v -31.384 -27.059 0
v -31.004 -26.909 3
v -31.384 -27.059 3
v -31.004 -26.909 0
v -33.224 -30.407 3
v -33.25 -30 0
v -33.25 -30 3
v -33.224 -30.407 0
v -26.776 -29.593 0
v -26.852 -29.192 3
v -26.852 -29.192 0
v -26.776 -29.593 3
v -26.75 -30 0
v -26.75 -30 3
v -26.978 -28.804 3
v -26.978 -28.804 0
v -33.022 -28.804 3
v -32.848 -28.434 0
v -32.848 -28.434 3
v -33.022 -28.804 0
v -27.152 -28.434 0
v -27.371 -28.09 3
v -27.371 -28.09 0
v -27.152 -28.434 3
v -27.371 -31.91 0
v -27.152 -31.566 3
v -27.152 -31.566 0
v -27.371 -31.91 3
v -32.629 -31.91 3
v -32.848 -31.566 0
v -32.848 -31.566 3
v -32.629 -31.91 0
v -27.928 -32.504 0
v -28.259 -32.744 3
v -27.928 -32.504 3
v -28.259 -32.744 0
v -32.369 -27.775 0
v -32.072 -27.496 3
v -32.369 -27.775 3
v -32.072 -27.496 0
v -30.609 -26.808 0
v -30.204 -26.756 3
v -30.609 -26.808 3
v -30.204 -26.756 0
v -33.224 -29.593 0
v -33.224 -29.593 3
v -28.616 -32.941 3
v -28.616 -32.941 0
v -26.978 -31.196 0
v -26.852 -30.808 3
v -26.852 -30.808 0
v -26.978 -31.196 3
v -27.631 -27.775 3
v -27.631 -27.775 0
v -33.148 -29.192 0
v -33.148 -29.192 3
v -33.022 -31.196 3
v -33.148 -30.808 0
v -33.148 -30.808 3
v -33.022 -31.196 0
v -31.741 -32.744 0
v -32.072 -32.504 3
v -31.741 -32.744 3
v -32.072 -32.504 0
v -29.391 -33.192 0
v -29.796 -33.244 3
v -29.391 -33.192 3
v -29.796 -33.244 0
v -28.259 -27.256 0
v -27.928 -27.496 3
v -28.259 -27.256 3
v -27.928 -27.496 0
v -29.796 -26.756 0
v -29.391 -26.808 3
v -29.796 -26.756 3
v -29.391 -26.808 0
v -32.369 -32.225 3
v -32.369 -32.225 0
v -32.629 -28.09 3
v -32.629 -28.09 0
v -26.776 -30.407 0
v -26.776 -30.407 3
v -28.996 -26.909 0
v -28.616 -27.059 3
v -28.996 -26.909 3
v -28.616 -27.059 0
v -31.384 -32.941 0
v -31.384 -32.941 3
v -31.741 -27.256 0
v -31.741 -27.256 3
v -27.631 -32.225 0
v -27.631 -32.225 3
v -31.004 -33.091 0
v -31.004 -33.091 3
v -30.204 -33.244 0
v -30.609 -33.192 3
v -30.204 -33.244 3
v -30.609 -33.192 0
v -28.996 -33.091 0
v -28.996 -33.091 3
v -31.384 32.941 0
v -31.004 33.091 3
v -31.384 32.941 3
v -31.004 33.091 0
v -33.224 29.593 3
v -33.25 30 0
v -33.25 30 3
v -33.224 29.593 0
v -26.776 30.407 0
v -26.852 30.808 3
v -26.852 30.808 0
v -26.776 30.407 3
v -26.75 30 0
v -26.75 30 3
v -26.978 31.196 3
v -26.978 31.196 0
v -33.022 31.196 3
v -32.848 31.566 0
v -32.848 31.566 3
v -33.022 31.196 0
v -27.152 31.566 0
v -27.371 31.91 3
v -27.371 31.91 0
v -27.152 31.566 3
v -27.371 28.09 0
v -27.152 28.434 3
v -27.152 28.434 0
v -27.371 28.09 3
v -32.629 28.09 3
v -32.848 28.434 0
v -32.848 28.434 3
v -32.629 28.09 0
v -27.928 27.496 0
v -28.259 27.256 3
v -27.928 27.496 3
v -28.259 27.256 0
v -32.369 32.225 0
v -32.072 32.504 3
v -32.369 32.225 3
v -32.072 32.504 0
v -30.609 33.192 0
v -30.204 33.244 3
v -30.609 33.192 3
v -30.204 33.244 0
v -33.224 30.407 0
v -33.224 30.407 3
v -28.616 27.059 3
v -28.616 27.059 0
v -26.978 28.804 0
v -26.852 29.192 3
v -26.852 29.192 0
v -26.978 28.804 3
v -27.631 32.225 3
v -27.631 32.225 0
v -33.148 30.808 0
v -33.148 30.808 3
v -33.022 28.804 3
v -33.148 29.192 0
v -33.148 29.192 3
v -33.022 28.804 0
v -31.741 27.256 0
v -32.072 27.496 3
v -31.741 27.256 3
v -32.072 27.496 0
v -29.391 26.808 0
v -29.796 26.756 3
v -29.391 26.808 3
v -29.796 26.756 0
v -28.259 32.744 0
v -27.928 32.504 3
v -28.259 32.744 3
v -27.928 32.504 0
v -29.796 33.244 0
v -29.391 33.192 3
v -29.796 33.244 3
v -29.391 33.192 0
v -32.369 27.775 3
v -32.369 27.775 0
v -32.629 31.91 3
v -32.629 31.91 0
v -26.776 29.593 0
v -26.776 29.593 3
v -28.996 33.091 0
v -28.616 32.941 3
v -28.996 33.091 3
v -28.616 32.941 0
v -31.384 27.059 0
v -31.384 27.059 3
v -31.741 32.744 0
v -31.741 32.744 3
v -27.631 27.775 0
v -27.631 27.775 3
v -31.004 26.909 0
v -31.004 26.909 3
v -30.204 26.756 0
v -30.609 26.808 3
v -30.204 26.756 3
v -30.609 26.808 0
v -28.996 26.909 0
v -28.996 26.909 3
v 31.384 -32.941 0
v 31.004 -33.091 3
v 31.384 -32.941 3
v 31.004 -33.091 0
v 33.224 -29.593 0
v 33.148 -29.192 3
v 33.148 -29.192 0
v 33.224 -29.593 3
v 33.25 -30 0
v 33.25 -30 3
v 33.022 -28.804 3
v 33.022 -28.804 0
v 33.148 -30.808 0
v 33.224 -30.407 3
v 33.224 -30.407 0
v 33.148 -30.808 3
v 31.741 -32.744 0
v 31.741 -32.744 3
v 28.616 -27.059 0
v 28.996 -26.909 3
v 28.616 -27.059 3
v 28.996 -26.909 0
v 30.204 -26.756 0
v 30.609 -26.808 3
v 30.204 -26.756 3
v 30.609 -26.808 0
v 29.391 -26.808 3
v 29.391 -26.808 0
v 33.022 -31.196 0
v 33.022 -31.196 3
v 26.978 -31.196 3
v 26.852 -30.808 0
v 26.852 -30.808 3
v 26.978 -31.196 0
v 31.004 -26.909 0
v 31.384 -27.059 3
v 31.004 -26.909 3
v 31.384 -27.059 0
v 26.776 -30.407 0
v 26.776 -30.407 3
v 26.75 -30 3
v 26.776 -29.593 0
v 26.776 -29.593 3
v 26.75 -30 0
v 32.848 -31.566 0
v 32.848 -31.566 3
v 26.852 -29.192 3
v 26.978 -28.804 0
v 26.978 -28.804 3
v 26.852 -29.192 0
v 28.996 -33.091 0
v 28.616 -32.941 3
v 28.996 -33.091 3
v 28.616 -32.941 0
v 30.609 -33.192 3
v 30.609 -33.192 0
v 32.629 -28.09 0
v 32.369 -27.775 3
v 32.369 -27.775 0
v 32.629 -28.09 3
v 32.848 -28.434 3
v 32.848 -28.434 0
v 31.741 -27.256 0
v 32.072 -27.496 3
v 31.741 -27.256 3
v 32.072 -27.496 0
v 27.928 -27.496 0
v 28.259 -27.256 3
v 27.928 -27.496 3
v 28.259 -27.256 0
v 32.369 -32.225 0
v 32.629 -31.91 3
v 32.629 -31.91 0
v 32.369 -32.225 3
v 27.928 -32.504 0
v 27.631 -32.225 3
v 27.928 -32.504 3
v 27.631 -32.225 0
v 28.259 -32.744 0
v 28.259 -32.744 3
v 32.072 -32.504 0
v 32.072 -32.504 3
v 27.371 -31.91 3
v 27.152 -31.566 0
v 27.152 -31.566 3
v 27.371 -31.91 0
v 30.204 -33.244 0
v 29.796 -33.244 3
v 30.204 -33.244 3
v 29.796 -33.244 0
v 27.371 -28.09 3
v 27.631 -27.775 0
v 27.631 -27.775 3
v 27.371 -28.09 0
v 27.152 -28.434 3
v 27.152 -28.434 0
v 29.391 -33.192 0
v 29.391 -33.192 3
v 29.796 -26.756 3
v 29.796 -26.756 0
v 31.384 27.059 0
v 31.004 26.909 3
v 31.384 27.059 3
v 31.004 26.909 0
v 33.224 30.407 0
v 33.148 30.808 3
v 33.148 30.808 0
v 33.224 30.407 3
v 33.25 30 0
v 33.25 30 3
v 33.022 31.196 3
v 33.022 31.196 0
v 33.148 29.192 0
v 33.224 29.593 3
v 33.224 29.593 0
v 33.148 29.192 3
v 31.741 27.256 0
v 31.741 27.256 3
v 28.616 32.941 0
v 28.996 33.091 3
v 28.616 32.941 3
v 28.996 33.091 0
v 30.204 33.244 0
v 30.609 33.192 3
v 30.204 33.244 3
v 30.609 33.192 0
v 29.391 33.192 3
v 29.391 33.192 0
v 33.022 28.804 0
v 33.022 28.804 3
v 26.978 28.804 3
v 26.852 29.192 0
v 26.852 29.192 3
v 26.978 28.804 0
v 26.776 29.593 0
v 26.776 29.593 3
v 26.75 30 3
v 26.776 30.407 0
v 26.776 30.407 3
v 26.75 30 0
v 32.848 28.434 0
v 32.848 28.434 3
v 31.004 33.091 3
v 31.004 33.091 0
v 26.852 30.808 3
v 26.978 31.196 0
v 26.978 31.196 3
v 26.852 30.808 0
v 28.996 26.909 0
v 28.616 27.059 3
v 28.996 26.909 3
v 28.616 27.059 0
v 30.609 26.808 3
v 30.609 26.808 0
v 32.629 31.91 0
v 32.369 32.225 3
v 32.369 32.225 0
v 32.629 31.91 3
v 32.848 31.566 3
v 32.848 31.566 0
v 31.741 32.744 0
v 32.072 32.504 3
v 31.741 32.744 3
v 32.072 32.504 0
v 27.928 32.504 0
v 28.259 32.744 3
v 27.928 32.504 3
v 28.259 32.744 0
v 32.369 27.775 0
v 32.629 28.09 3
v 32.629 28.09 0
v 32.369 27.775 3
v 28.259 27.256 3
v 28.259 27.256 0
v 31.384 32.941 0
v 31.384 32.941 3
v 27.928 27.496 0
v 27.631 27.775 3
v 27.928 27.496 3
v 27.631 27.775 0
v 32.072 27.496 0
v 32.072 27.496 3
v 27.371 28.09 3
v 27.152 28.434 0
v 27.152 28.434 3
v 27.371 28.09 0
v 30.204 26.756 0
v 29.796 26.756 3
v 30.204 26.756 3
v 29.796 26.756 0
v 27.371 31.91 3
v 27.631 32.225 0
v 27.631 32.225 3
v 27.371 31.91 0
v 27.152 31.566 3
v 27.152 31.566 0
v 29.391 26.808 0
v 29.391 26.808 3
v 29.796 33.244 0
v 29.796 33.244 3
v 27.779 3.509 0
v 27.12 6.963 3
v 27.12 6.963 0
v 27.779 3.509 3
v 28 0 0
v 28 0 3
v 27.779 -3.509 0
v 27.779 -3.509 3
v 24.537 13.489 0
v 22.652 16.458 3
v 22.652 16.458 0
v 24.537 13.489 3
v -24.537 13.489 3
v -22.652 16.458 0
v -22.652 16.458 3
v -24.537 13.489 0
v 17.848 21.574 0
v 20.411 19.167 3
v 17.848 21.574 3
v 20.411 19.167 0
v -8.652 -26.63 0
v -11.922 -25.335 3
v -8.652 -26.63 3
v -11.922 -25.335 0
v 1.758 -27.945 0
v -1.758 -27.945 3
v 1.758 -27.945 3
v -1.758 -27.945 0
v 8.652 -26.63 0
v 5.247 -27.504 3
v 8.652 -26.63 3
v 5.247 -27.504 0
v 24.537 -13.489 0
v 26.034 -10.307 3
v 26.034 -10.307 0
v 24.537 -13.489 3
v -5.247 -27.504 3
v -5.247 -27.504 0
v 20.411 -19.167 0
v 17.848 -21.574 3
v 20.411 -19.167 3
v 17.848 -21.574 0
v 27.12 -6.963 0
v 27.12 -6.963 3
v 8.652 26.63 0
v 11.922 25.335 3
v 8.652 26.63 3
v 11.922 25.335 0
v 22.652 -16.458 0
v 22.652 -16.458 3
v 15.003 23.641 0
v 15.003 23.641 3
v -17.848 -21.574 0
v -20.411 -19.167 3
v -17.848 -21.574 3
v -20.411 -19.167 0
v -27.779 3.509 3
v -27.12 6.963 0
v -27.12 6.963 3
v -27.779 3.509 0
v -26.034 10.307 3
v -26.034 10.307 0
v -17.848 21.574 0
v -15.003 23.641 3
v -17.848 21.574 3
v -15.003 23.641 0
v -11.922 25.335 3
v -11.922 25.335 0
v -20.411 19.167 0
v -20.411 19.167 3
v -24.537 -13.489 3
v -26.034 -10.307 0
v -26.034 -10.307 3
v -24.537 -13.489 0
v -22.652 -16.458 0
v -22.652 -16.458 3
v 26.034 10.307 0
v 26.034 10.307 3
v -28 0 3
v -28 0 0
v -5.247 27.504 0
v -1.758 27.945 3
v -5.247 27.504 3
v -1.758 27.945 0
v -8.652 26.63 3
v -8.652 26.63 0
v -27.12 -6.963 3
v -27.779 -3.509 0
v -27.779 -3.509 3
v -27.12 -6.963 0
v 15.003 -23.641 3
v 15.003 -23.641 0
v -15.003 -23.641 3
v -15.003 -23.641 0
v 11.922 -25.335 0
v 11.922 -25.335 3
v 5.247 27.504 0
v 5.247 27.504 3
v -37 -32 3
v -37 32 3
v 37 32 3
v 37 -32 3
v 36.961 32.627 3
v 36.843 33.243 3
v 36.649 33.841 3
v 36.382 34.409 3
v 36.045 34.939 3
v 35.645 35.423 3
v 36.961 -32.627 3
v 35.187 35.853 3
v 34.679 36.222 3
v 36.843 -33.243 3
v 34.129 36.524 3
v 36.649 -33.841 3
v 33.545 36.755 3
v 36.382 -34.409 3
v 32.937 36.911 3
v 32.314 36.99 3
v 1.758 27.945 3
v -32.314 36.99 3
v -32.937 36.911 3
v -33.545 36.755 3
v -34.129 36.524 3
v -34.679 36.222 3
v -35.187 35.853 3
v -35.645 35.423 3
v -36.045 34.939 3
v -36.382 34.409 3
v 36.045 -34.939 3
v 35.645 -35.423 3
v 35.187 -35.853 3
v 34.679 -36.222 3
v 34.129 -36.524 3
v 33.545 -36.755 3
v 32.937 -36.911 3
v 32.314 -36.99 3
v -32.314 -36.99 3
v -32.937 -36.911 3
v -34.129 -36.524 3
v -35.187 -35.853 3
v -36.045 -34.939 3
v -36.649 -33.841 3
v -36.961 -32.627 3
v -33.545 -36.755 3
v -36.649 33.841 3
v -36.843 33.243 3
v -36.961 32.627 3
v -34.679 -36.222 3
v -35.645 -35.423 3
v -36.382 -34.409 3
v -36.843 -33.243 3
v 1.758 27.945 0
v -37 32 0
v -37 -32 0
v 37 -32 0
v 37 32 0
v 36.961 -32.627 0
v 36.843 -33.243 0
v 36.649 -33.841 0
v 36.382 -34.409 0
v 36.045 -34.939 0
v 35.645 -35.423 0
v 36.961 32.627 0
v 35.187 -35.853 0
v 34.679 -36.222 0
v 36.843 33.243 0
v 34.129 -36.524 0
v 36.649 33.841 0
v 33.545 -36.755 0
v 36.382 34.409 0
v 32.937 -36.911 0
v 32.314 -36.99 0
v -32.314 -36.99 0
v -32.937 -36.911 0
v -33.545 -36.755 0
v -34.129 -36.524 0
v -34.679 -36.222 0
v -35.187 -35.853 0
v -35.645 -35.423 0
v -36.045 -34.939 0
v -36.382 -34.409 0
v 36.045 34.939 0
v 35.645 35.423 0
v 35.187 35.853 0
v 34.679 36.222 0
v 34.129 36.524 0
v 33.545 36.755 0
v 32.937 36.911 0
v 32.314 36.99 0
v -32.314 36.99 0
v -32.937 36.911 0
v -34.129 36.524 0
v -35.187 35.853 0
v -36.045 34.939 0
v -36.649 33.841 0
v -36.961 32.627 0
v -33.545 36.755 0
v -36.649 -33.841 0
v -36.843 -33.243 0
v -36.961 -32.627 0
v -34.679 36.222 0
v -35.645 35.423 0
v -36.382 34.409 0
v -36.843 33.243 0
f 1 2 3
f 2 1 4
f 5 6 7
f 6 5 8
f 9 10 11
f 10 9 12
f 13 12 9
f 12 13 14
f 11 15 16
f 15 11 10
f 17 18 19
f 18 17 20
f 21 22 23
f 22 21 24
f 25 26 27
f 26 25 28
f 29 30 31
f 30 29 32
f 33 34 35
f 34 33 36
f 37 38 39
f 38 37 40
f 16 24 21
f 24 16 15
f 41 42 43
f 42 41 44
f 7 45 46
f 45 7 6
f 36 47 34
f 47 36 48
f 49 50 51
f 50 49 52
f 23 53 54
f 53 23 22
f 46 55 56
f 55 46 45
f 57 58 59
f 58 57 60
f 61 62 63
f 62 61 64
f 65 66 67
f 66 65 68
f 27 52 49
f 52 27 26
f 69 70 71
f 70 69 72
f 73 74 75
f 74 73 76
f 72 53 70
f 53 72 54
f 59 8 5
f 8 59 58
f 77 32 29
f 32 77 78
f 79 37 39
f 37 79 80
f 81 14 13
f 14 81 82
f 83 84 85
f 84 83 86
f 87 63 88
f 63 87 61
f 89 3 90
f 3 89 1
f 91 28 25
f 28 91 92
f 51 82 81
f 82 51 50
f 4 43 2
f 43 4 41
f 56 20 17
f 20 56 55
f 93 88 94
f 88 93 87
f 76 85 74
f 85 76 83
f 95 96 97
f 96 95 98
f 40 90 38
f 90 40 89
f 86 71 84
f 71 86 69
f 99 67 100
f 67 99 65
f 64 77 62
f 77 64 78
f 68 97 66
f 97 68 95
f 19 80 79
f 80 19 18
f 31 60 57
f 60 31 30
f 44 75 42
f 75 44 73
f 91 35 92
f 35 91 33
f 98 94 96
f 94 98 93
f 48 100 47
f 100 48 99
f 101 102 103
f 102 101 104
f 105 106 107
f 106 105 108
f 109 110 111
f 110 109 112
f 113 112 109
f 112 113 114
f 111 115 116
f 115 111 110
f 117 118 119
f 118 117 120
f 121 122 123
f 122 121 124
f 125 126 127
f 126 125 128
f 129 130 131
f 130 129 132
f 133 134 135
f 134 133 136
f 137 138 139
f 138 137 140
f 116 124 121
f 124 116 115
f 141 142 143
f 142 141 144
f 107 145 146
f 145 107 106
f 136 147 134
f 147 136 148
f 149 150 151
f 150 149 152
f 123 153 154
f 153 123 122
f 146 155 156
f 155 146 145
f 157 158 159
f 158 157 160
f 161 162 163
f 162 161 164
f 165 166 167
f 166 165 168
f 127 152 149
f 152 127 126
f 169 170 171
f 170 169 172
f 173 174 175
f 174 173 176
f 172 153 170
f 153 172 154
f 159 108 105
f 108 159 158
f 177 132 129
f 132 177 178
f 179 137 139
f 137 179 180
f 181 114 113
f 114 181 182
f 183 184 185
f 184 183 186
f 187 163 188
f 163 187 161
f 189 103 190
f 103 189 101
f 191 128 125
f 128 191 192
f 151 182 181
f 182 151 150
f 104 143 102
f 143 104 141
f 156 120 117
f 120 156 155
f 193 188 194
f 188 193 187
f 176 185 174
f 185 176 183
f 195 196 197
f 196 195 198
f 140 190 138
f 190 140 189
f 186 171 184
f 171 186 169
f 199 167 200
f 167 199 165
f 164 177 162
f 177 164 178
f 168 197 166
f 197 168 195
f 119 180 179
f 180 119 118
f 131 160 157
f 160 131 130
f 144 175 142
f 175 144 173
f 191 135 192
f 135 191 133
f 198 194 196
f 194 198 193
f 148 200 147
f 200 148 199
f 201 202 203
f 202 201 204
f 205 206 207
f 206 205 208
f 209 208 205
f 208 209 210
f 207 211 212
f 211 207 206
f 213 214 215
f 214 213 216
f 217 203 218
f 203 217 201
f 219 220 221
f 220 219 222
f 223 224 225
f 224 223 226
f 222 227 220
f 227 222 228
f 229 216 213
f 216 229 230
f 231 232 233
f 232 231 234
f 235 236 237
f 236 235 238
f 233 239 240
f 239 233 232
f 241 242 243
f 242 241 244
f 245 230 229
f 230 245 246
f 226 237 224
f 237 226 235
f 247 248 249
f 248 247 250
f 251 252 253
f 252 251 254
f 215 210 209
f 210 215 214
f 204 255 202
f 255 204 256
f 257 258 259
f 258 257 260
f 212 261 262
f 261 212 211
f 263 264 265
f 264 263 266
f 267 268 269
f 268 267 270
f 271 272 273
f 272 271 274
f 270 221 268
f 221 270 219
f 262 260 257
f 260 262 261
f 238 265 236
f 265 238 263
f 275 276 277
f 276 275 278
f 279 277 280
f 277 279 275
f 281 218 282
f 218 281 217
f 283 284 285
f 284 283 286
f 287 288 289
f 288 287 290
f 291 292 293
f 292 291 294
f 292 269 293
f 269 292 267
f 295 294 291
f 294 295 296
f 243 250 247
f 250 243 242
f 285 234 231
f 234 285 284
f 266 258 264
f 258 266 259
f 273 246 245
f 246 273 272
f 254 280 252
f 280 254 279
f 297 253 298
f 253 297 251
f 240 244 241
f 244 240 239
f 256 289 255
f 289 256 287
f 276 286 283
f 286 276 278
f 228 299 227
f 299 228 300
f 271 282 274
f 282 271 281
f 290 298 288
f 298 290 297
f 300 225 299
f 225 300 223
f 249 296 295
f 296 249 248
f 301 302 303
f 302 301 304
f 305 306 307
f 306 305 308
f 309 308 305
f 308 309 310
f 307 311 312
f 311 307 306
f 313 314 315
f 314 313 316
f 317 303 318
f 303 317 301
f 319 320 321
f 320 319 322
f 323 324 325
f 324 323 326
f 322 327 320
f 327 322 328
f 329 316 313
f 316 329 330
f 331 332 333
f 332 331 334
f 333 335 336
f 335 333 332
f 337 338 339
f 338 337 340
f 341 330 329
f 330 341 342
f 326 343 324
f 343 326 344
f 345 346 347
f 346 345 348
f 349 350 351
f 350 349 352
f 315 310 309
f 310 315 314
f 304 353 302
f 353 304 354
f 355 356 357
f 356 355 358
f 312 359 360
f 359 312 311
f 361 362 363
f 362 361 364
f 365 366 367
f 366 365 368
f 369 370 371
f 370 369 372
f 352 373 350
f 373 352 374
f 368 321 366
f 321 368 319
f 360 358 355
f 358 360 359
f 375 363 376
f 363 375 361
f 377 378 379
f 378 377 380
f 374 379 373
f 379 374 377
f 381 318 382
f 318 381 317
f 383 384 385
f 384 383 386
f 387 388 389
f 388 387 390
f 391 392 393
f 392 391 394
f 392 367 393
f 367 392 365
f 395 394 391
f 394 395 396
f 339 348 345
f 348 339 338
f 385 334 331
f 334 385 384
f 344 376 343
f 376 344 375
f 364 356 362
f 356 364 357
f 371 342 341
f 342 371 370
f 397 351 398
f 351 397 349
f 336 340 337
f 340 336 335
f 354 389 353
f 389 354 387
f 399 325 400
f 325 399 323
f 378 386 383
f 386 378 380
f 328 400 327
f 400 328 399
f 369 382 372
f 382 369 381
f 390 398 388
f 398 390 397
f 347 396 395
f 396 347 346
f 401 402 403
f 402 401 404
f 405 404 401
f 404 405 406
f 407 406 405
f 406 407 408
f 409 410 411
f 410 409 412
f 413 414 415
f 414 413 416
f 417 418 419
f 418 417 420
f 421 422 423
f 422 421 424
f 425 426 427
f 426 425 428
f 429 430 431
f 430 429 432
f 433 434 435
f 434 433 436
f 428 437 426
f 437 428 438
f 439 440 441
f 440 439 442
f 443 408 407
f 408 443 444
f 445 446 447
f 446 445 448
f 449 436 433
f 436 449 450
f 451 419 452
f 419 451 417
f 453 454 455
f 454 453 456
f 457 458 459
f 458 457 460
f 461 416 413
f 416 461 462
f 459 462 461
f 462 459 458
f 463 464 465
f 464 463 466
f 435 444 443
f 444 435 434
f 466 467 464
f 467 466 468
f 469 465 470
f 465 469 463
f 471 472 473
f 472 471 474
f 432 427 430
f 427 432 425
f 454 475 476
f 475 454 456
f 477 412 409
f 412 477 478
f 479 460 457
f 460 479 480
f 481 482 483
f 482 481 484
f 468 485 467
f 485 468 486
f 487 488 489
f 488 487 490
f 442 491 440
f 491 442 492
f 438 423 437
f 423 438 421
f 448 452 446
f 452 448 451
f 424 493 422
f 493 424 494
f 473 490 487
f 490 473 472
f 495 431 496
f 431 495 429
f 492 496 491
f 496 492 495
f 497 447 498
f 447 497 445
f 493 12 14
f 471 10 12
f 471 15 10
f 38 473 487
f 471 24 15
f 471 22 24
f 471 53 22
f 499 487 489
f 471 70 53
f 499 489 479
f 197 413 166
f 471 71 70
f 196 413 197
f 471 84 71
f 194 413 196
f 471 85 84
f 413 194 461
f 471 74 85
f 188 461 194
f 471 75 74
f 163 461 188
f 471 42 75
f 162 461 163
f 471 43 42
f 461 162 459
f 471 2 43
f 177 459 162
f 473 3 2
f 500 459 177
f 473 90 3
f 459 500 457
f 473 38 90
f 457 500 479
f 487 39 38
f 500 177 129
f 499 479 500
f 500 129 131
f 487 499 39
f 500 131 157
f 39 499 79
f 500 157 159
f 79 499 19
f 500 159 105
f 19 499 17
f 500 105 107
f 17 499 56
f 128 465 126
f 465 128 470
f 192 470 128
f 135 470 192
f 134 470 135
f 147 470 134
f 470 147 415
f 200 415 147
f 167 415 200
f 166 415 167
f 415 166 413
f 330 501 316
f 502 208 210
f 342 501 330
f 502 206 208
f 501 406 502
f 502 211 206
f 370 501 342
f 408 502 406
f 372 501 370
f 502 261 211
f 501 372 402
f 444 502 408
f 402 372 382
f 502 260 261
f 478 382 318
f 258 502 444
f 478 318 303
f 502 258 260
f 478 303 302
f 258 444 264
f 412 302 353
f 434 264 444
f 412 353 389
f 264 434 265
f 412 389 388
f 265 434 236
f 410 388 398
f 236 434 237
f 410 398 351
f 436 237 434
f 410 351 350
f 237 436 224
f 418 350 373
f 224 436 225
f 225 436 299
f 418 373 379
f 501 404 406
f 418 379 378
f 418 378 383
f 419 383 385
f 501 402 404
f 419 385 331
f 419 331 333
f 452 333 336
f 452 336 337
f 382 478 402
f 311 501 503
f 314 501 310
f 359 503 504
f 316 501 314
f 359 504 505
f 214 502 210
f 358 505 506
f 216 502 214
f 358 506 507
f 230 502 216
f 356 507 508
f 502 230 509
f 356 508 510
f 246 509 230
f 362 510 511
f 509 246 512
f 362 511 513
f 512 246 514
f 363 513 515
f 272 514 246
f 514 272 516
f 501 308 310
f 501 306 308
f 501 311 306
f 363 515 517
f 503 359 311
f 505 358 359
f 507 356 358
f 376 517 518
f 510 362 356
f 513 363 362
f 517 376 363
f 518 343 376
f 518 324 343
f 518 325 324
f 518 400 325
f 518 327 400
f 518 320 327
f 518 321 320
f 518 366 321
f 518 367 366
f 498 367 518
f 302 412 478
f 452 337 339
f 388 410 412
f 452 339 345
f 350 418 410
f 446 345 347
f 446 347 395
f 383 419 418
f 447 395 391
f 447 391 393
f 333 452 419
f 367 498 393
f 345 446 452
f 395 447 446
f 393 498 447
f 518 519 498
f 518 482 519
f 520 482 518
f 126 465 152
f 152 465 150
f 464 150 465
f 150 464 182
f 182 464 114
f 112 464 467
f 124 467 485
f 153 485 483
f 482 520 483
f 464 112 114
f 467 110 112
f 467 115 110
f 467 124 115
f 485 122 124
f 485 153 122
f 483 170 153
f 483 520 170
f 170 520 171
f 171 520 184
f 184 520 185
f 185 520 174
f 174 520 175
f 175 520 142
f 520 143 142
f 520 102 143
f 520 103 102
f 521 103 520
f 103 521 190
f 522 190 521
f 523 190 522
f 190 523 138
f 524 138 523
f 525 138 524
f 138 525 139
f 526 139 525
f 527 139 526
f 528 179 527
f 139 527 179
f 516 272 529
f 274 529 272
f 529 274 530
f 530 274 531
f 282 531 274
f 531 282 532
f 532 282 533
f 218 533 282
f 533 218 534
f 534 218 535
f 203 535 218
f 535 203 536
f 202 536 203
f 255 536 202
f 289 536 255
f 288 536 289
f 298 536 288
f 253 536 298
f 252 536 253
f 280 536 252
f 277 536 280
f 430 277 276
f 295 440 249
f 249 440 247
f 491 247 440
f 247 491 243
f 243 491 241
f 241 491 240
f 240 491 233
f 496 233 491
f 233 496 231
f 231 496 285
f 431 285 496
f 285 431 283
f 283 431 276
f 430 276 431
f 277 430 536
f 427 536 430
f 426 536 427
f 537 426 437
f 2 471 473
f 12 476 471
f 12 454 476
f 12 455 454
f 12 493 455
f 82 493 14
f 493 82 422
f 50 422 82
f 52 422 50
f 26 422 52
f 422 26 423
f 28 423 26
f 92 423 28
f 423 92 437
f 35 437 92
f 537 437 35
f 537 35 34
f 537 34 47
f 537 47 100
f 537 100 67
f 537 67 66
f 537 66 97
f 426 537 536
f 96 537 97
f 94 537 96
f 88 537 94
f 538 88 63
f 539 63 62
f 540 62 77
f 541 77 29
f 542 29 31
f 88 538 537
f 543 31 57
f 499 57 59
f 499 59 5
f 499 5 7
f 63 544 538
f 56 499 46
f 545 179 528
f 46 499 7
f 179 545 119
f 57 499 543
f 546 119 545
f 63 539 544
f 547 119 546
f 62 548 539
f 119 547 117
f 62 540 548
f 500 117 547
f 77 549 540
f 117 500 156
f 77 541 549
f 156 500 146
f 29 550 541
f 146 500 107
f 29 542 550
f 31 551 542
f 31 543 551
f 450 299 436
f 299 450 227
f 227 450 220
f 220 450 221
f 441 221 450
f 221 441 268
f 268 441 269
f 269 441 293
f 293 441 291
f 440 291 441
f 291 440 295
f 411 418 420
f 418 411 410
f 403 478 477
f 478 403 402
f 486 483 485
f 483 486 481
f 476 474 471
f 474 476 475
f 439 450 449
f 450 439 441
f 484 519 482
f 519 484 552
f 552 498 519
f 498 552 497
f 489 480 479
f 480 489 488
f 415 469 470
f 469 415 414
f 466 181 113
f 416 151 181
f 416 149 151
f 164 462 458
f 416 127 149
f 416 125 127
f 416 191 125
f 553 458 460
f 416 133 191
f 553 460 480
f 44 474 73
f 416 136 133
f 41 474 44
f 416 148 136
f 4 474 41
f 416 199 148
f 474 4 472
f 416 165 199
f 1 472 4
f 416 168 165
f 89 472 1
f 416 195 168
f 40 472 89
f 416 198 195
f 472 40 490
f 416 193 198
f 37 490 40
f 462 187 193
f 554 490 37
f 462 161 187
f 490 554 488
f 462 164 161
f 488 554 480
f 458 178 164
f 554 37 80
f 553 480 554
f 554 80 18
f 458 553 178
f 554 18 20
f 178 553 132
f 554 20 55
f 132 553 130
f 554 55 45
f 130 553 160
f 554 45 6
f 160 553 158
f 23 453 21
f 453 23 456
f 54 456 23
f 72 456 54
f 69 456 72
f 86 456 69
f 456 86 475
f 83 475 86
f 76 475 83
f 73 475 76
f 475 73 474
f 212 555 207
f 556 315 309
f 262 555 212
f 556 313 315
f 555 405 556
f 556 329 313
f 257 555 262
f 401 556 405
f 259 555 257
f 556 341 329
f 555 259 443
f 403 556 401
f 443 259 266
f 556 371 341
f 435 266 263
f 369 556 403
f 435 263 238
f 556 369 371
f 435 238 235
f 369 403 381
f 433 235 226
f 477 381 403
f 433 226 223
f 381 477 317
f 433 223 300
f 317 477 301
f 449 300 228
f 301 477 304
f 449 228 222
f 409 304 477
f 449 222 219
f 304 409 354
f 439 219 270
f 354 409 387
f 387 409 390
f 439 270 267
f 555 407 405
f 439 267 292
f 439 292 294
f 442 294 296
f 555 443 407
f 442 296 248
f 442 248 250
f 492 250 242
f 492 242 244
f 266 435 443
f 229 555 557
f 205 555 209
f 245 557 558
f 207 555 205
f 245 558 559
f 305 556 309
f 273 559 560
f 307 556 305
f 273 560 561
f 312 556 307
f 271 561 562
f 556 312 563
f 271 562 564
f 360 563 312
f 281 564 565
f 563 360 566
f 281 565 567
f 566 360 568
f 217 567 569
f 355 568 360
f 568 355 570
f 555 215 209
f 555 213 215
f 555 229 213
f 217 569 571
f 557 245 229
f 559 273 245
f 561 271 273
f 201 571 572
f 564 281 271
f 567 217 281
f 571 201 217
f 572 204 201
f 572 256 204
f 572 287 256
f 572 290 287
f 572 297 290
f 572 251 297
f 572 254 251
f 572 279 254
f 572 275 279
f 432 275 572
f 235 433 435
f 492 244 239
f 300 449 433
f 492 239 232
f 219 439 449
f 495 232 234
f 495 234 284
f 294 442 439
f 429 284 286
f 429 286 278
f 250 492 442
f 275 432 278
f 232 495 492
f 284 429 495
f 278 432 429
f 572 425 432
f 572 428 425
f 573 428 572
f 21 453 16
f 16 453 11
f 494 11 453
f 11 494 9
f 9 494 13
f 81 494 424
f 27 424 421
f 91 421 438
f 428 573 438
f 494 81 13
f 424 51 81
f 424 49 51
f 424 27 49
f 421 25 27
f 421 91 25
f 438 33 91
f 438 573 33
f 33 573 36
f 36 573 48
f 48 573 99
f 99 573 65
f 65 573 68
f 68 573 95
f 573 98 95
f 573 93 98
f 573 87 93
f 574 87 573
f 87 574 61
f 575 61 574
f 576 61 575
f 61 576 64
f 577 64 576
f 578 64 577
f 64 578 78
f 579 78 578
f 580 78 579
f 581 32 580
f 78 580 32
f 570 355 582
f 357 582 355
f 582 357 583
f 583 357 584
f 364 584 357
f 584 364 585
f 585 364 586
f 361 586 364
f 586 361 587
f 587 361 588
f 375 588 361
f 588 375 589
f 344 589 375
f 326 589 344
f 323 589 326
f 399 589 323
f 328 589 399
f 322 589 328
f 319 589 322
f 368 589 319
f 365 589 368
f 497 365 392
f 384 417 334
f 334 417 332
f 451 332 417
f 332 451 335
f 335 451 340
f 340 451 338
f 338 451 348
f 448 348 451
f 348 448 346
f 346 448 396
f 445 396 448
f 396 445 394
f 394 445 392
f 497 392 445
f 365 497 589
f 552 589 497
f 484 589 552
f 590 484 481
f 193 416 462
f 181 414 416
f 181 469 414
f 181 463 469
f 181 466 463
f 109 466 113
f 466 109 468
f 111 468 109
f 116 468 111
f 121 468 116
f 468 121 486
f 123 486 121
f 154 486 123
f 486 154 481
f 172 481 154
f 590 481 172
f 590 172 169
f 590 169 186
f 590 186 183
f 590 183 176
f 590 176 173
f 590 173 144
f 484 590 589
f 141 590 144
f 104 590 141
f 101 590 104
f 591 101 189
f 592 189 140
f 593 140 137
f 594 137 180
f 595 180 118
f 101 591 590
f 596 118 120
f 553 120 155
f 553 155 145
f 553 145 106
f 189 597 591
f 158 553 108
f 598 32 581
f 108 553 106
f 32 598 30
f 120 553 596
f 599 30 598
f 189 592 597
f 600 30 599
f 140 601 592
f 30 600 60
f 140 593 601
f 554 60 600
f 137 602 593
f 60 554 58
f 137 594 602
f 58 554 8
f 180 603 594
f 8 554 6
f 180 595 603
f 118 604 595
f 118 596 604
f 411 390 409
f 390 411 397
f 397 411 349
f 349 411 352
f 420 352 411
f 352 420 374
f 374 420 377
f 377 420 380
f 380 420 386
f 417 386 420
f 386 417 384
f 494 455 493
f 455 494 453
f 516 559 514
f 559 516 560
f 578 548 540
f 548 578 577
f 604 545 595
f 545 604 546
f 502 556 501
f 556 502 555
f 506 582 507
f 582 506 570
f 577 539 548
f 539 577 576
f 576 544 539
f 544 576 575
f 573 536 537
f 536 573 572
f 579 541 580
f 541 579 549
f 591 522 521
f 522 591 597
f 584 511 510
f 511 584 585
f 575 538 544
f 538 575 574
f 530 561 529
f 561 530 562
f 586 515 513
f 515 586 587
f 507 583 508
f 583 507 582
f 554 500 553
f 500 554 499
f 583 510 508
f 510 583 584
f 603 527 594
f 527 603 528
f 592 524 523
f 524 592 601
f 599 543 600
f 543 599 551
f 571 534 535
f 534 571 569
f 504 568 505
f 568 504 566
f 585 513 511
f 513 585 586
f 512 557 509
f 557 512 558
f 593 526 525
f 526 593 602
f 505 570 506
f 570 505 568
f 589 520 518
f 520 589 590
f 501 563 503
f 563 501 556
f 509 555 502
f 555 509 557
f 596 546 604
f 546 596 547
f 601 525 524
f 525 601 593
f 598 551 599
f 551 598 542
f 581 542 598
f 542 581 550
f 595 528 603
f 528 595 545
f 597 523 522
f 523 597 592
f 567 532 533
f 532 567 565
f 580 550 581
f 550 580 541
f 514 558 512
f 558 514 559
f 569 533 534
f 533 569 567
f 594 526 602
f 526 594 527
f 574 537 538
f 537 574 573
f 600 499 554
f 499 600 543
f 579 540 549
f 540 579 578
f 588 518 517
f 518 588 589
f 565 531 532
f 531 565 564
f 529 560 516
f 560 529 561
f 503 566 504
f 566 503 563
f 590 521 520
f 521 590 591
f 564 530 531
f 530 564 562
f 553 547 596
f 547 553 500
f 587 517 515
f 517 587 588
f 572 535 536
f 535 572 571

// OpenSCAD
$fn = 50;

difference() {
	union() {
		hull() {
			translate(v = [-32.0, 32.0, 0]) {
				cylinder(h = 3, r = 5);
			}
			translate(v = [32.0, 32.0, 0]) {
				cylinder(h = 3, r = 5);
			}
			translate(v = [-32.0, -32.0, 0]) {
				cylinder(h = 3, r = 5);
			}
			translate(v = [32.0, -32.0, 0]) {
				cylinder(h = 3, r = 5);
			}
		}
	}
	union() {
		translate(v = [-30.0, -30.0, -100.0]) {
			cylinder(h = 200, r = 3.25);
		}
		translate(v = [-30.0, 30.0, -100.0]) {
			cylinder(h = 200, r = 3.25);
		}
		translate(v = [30.0, -30.0, -100.0]) {
			cylinder(h = 200, r = 3.25);
		}
		translate(v = [30.0, 30.0, -100.0]) {
			cylinder(h = 200, r = 3.25);
		}
		translate(v = [-30.0, -30.0, -100.0]) {
			cylinder(h = 200, r = 1.8);
		}
		translate(v = [-30.0, 30.0, -100.0]) {
			cylinder(h = 200, r = 1.8);
		}
		translate(v = [30.0, -30.0, -100.0]) {
			cylinder(h = 200, r = 1.8);
		}
		translate(v = [30.0, 30.0, -100.0]) {
			cylinder(h = 200, r = 1.8);
		}
		cylinder(h = 3, r = 28.0);
	}
}
